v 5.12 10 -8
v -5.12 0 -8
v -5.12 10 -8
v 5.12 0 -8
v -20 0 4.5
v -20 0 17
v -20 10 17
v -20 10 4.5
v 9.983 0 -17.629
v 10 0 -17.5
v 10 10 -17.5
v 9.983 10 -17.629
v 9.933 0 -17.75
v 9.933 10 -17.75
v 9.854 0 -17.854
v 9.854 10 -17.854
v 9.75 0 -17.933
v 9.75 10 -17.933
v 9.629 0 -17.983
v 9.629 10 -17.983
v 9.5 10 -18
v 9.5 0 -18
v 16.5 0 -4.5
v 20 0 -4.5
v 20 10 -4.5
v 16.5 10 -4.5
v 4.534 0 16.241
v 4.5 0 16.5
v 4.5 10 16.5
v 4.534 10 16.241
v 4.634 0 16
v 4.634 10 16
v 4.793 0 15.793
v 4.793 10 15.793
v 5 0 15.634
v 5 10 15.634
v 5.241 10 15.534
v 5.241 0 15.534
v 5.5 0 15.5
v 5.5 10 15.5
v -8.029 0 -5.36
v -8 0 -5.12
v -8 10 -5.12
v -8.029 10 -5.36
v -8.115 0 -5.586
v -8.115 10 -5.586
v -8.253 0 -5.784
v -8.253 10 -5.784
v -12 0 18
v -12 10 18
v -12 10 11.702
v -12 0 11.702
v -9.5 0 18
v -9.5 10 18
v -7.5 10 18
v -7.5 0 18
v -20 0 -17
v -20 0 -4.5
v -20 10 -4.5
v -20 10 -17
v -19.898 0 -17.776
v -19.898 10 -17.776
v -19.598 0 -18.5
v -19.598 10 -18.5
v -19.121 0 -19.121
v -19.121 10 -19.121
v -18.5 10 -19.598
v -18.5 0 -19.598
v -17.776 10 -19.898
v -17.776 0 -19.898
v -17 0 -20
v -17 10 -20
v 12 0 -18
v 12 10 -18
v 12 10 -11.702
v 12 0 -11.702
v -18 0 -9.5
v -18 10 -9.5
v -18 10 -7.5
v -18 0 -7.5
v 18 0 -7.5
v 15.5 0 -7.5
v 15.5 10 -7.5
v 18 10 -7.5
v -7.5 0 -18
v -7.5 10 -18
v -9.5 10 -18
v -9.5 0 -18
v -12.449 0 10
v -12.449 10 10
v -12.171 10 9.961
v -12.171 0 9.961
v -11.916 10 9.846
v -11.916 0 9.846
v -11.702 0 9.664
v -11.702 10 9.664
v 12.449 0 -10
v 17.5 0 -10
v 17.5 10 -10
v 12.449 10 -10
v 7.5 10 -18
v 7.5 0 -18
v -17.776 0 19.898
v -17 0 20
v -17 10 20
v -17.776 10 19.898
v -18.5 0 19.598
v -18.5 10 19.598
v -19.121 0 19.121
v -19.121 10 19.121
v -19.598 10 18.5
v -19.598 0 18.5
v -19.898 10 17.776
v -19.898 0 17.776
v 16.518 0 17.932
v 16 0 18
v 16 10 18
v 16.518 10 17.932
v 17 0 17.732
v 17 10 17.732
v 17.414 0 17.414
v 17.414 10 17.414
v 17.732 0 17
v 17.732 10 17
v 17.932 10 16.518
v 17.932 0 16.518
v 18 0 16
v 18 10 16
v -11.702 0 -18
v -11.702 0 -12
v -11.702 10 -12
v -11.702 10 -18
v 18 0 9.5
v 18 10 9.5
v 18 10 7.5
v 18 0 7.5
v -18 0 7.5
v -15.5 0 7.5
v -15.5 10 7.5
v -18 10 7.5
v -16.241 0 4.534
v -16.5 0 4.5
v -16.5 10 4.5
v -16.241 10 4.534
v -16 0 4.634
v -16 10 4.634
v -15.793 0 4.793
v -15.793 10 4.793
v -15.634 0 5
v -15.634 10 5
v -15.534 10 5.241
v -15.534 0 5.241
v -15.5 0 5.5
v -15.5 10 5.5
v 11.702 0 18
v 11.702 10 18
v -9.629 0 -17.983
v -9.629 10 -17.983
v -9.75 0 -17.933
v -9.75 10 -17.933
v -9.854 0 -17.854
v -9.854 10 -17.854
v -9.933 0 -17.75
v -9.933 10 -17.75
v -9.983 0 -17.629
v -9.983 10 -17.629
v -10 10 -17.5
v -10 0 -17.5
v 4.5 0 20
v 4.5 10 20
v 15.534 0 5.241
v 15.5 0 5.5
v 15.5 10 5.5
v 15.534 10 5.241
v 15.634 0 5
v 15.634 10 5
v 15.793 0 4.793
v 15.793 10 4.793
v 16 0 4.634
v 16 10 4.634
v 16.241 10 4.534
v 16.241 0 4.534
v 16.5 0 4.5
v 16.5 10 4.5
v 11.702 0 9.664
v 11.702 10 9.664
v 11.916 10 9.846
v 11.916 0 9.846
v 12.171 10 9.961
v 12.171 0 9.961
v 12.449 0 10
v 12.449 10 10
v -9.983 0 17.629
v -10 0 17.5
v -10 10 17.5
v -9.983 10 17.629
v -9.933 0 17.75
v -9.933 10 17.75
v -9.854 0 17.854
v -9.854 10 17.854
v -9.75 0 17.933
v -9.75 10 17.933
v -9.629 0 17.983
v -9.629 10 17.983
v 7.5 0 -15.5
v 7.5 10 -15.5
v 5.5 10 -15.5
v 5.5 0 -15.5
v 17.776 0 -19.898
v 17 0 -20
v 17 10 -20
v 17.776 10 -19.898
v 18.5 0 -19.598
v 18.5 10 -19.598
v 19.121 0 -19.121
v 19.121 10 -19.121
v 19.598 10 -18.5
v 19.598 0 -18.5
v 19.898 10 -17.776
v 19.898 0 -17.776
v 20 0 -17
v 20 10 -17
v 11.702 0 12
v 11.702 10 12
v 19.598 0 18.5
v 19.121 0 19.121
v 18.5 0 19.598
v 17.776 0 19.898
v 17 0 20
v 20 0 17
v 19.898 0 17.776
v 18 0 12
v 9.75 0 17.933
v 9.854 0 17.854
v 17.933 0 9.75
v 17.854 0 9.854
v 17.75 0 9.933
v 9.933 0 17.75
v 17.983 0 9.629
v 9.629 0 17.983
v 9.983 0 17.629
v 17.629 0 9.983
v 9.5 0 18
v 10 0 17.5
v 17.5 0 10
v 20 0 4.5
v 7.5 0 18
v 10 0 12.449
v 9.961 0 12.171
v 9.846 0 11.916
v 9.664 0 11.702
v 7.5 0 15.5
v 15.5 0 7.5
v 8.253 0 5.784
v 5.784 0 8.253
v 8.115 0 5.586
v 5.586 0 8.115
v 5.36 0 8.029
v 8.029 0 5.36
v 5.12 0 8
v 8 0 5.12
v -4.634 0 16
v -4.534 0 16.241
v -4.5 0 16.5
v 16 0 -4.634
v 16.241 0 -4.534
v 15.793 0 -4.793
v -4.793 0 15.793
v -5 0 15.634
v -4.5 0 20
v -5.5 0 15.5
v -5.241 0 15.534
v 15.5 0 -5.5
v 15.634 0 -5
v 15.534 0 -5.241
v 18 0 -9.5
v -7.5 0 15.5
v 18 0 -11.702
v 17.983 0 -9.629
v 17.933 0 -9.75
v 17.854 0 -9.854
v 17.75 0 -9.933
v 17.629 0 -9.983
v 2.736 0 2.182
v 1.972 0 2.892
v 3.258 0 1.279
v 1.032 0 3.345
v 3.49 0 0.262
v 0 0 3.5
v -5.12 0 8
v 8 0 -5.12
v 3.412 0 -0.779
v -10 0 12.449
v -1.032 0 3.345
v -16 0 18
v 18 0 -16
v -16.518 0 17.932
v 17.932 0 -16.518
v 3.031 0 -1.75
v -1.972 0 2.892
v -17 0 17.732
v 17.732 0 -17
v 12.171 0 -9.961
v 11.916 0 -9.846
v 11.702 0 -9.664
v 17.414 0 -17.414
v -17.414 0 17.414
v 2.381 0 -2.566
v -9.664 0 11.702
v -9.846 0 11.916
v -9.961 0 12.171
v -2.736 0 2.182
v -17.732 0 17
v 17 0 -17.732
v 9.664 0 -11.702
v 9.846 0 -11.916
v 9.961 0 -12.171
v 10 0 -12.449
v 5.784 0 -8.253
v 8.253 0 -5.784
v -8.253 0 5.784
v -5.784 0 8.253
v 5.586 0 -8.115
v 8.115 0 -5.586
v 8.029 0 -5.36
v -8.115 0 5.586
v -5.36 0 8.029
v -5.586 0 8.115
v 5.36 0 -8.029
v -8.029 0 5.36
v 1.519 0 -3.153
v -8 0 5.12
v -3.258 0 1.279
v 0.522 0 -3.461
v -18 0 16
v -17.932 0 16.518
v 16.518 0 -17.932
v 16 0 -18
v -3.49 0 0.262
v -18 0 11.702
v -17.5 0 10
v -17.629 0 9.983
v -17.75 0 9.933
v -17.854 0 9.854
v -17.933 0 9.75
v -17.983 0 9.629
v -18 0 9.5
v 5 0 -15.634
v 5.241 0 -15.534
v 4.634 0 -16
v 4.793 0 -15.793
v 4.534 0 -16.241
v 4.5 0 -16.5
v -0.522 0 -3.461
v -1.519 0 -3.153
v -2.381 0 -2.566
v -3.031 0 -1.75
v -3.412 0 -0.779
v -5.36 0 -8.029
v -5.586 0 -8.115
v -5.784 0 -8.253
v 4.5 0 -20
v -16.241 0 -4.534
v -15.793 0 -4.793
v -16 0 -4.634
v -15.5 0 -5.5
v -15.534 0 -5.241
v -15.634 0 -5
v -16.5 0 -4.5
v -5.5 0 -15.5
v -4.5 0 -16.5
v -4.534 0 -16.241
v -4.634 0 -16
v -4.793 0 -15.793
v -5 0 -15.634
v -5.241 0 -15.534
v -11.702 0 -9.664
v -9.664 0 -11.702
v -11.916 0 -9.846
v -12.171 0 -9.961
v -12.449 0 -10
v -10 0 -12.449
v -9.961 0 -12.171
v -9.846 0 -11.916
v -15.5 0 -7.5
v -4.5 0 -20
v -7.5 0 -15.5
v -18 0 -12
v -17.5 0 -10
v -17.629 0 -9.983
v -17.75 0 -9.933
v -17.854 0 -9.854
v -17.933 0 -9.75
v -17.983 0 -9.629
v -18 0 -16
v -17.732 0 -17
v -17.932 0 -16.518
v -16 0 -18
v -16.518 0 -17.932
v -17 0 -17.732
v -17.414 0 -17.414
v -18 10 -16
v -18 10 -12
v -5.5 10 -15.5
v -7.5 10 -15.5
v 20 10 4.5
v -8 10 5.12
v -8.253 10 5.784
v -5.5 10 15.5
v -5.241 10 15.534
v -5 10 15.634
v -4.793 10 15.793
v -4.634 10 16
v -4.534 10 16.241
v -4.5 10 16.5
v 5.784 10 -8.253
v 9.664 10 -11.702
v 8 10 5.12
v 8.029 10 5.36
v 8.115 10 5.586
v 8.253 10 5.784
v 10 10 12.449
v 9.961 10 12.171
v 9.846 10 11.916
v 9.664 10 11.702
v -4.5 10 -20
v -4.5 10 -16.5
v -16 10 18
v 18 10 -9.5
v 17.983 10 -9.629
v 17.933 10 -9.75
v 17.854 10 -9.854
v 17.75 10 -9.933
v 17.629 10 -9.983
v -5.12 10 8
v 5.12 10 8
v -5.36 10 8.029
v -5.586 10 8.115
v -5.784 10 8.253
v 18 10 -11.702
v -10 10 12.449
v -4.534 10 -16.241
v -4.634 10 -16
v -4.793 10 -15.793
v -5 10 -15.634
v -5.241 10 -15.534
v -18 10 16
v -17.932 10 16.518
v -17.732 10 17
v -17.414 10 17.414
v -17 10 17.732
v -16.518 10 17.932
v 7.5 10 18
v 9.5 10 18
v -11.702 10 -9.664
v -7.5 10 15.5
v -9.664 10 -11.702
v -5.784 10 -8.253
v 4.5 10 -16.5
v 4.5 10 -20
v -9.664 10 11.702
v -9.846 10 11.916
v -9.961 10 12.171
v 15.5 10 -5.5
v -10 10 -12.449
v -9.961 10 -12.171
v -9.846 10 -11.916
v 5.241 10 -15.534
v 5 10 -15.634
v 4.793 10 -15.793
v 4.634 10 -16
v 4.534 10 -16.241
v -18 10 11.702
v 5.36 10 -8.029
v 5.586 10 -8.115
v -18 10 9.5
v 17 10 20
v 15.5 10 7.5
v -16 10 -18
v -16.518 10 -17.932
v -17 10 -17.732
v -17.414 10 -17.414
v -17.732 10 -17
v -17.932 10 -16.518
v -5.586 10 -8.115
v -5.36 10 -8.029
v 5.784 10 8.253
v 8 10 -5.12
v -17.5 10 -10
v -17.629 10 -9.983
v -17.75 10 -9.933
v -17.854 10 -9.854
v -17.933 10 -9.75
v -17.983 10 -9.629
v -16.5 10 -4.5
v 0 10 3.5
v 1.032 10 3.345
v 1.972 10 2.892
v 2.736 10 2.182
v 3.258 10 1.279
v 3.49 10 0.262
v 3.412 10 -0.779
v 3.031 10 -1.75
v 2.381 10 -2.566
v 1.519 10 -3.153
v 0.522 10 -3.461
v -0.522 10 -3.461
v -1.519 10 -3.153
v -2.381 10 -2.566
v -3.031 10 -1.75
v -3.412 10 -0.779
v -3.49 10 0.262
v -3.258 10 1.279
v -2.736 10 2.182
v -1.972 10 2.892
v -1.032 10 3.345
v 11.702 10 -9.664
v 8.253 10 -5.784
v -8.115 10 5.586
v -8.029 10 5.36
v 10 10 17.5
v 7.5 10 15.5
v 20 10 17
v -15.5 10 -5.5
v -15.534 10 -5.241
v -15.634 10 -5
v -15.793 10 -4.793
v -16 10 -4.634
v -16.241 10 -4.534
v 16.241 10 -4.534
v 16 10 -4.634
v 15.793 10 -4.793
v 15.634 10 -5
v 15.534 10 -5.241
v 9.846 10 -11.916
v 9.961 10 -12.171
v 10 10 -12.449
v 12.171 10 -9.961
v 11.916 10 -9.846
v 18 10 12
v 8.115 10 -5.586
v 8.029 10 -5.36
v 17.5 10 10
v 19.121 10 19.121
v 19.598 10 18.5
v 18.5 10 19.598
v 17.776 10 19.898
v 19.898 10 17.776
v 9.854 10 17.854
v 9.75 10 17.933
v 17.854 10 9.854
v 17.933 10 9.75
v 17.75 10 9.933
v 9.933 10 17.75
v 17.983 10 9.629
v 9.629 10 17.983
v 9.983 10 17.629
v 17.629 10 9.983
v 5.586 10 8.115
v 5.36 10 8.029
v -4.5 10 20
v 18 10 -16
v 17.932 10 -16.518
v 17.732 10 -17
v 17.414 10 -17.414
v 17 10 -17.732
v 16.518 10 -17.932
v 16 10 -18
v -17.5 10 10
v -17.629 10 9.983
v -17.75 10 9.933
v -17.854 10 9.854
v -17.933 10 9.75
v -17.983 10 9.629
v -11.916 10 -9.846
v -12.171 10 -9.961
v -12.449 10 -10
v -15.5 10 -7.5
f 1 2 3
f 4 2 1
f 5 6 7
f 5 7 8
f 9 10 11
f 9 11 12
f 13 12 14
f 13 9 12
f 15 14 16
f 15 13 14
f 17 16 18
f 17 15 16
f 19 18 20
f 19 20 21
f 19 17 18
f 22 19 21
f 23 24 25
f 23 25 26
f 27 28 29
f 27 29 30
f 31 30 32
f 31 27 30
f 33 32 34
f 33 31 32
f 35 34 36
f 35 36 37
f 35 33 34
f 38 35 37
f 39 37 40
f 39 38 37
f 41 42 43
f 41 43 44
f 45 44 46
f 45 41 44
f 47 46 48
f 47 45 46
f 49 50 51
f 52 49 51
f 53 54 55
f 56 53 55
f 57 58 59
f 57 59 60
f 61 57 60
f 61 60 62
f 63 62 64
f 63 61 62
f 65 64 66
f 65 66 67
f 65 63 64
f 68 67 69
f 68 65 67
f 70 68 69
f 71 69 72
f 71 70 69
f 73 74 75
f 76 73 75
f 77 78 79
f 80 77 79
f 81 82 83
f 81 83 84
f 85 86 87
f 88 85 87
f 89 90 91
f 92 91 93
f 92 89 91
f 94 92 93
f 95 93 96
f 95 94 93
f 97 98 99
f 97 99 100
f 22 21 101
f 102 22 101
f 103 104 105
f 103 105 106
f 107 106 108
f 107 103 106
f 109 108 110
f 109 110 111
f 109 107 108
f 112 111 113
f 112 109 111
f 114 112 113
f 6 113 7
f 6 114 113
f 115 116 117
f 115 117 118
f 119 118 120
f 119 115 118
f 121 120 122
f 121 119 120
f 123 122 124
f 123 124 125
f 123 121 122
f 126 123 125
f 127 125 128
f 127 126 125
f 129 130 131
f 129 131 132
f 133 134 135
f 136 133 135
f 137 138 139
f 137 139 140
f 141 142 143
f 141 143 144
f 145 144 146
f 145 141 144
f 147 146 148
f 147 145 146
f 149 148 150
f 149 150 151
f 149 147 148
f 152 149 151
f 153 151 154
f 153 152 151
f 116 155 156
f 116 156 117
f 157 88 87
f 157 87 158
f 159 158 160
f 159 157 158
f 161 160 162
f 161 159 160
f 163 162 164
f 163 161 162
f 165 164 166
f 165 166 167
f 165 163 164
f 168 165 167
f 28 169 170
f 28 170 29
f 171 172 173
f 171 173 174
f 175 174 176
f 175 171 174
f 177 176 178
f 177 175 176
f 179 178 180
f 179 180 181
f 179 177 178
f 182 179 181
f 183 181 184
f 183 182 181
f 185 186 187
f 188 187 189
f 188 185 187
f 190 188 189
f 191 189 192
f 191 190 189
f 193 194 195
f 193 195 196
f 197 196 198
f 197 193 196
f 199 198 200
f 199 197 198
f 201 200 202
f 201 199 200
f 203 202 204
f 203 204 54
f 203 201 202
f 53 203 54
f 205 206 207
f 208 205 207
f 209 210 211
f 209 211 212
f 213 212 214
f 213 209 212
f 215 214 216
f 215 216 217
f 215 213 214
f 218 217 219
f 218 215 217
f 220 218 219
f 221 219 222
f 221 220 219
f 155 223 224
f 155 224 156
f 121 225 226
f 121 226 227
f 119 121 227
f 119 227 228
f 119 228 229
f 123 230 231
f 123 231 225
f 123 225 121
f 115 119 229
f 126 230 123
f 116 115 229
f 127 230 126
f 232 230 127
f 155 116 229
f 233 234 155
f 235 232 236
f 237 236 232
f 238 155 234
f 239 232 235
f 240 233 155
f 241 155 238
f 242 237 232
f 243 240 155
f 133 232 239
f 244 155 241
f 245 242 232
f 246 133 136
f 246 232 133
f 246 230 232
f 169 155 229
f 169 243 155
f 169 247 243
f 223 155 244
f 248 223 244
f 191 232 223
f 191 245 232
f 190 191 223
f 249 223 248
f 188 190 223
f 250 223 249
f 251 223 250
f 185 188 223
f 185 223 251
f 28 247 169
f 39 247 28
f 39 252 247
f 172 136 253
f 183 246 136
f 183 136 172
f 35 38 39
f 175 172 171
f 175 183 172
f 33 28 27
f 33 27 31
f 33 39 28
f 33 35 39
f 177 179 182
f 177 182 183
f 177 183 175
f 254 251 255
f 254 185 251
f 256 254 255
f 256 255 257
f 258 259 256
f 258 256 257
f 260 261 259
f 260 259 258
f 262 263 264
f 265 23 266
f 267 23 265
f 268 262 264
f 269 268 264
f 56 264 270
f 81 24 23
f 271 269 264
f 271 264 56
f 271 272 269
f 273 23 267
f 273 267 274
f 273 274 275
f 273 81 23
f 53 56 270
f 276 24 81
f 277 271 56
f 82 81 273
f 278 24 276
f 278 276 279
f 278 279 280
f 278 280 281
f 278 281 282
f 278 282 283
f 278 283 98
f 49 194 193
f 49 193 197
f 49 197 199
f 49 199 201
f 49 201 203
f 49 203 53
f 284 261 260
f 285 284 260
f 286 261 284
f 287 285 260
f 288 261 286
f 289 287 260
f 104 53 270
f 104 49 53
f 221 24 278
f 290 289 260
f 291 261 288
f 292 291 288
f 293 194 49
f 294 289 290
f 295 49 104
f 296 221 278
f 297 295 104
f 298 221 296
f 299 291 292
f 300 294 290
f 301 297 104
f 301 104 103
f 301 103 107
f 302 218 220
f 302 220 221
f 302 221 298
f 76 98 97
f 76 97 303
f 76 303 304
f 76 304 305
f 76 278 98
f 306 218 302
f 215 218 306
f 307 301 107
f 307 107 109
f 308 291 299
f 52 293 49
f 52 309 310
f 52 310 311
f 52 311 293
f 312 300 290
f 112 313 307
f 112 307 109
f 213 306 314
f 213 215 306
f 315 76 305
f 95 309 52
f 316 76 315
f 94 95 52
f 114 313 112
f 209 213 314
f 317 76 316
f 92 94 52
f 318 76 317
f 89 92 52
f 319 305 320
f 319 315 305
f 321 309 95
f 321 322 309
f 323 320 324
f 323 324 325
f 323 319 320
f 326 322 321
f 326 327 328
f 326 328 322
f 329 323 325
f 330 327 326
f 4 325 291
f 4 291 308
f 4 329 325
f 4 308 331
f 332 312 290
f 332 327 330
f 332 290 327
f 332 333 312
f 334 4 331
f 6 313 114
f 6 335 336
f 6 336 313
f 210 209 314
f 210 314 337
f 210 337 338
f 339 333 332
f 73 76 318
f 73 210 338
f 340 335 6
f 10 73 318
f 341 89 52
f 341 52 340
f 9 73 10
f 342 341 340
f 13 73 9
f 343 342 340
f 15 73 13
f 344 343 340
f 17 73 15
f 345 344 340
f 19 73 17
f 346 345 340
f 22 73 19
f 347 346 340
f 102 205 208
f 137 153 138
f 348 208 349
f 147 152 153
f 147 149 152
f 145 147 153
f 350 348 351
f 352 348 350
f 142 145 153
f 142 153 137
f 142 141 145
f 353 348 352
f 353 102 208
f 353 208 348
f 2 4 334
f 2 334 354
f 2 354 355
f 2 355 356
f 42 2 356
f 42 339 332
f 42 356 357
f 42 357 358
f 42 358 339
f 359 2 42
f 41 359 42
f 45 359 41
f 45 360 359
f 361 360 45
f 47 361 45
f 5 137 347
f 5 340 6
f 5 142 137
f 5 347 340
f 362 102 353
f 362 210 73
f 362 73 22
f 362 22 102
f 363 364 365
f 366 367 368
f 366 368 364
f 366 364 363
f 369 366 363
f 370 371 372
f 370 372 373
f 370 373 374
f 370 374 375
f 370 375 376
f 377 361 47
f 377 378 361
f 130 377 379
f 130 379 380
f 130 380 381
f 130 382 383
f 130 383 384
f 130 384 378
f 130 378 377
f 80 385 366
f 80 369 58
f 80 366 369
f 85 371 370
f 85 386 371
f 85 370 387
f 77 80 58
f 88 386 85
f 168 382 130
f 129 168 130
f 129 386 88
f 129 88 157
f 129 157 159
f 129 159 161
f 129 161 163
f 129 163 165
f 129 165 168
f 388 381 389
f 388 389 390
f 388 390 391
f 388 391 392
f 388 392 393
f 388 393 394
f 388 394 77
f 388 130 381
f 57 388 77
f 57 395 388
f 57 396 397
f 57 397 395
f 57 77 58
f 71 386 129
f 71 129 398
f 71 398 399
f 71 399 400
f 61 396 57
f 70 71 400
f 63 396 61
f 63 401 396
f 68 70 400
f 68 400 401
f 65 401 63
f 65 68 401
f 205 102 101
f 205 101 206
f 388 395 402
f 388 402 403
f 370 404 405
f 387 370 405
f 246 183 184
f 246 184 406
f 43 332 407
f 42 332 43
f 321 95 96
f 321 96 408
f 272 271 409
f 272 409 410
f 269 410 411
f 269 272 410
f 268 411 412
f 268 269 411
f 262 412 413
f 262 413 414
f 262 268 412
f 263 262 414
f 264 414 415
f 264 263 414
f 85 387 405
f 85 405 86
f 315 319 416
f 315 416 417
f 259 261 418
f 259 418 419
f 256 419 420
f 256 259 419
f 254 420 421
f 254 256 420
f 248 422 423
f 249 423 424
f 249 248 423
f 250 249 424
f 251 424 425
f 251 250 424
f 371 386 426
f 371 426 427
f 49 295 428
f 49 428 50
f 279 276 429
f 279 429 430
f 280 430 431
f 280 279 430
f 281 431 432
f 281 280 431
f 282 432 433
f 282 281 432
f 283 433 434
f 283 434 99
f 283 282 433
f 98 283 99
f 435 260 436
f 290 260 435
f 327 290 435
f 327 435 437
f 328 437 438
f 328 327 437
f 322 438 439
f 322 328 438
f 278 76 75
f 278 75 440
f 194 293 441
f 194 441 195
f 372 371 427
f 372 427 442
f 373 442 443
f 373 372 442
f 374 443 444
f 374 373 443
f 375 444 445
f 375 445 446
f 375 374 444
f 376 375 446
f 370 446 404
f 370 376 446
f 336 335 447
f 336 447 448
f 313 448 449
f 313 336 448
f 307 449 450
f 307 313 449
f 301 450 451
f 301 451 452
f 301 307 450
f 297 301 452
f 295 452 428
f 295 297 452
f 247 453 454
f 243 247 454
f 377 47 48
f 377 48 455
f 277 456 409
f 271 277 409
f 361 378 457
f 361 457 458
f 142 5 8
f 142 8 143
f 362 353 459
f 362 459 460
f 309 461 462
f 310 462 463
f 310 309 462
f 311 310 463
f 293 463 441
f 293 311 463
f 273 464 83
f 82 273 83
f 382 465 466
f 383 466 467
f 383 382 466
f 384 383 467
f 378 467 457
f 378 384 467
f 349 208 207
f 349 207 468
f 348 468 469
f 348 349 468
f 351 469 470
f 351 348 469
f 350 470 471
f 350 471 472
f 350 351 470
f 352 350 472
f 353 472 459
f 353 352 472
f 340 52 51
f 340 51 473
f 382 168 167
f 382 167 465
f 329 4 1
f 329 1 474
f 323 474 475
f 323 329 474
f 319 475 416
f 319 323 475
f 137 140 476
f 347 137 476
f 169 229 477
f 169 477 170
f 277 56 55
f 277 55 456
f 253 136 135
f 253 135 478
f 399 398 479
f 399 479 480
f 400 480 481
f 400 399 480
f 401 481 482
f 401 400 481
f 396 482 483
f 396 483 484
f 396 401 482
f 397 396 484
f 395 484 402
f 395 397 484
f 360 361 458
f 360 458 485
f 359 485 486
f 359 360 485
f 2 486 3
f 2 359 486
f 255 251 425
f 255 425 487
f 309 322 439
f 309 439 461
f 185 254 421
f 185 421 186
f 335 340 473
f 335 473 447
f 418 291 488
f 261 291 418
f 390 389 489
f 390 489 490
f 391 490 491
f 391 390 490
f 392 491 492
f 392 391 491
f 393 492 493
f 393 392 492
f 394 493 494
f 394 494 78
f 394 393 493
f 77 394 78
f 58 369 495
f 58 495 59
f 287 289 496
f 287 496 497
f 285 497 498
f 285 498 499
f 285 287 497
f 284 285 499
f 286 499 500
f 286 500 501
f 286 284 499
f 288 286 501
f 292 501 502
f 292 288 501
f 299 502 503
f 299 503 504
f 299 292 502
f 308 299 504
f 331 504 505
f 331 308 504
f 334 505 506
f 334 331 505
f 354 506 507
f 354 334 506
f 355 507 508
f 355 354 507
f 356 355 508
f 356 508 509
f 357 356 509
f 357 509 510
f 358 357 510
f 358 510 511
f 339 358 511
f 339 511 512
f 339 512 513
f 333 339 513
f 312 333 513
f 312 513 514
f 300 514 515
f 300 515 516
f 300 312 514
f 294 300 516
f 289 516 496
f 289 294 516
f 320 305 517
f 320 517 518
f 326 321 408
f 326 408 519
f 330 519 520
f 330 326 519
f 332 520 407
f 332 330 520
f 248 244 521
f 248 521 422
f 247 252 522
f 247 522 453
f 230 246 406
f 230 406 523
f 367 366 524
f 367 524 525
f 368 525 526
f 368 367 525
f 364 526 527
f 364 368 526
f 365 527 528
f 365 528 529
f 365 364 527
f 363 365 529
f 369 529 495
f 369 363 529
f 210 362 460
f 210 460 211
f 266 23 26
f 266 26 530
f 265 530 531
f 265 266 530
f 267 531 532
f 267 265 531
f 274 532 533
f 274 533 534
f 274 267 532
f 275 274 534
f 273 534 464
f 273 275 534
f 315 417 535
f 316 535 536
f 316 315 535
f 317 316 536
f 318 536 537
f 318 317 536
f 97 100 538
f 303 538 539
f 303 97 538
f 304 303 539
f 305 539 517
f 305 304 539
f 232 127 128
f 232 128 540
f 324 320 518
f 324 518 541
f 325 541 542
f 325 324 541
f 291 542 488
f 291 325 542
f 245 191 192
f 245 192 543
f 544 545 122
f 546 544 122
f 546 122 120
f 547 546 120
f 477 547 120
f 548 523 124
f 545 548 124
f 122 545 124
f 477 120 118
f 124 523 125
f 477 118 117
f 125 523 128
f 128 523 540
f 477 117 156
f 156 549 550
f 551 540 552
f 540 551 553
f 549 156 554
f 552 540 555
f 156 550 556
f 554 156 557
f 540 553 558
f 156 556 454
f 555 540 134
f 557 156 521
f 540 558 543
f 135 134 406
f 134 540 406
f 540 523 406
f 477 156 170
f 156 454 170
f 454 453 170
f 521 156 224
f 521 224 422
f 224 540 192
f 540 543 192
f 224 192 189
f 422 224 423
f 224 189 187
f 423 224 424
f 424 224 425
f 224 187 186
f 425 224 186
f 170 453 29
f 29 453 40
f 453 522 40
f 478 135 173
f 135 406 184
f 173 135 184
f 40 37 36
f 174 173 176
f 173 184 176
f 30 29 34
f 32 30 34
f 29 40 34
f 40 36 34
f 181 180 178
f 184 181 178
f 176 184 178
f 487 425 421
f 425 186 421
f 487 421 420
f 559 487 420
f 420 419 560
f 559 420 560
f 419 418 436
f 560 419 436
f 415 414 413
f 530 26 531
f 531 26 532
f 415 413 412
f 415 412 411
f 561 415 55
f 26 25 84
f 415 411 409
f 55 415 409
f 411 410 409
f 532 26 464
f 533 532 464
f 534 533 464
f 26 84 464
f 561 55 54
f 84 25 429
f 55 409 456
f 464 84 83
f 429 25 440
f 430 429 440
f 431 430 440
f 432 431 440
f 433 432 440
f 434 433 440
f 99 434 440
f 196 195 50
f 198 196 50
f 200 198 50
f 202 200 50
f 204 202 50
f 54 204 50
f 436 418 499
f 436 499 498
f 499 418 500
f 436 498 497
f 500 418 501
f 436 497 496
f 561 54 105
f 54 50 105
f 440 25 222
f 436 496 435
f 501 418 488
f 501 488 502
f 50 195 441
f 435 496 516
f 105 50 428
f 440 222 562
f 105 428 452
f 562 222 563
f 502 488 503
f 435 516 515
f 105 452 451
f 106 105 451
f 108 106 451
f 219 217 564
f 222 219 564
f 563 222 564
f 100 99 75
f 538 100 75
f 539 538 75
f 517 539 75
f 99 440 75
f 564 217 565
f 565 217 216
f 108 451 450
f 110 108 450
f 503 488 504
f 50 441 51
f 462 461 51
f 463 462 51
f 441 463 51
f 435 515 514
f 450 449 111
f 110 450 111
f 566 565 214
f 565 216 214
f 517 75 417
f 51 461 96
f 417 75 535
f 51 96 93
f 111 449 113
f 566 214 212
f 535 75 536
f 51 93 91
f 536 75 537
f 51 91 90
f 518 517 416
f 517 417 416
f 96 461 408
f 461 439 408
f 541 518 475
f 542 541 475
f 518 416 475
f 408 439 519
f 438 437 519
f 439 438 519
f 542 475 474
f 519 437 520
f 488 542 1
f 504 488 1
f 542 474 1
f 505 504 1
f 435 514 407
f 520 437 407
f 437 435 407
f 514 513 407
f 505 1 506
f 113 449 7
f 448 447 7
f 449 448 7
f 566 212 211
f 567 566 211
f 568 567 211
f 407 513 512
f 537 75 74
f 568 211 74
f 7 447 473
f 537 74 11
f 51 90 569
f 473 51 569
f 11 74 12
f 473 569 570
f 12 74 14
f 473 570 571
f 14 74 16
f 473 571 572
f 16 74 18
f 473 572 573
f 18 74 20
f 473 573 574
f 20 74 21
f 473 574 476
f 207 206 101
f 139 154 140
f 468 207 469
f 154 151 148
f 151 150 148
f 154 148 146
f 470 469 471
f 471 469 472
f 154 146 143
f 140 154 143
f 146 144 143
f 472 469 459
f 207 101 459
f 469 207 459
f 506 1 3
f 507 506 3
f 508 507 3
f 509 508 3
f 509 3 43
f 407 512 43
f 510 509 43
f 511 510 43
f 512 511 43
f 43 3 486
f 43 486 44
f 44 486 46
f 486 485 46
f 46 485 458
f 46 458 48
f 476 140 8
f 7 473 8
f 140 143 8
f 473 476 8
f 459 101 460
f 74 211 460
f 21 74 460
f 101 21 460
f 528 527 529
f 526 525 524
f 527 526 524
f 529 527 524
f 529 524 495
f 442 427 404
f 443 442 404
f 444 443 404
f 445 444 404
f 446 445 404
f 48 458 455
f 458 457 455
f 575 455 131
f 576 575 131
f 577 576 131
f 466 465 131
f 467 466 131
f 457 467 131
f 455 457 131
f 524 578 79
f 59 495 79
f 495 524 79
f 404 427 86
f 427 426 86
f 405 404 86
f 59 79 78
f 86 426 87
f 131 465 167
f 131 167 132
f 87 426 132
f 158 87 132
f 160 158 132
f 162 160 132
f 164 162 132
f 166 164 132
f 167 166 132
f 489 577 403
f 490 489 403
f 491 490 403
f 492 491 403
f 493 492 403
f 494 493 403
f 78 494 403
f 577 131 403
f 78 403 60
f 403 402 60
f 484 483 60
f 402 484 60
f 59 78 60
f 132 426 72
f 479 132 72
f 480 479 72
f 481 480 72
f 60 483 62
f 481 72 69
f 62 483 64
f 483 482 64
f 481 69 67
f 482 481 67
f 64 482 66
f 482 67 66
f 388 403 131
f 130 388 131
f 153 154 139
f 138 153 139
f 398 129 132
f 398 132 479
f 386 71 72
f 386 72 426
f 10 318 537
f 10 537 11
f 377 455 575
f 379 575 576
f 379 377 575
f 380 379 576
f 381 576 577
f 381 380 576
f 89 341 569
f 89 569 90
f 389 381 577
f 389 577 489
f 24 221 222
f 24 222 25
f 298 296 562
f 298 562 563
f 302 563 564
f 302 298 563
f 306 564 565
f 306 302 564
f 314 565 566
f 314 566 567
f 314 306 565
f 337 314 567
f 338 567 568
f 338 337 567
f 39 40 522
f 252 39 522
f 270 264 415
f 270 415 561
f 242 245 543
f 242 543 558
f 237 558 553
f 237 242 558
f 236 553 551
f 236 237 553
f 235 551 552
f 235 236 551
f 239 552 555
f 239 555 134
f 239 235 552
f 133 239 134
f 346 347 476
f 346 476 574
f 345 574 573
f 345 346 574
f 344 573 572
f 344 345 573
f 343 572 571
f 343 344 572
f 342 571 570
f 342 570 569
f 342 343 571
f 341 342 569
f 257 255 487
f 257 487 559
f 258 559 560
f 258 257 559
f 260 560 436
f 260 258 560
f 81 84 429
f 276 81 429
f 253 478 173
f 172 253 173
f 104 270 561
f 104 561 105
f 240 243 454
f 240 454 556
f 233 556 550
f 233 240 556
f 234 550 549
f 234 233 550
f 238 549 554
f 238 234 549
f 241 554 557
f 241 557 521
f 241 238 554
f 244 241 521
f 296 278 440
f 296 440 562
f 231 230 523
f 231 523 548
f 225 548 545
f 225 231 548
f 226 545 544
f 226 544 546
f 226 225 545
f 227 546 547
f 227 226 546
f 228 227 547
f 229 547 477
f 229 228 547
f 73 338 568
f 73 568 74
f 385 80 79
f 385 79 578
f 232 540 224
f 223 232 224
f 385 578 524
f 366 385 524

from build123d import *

# Parameters (mm, degrees)
SKETCH_1_R      = 3.5
EXTRUDE_1_DEPTH = 10


with BuildPart() as part:
    # 草图1 → 凸台-拉伸1 (new body)
    with BuildSketch(Plane(origin=(0, 0, 0), x_dir=(1, 0, 0), z_dir=(0, 1, 0))):
        with BuildLine():
            Line((11.701656746, 9.664363839), (8.252590681, 5.784164516))
            ThreePointArc((8.252590681, 5.784164516), (8.065278298, 5.475181235), (8, 5.119800678))
            Line((8, 5.119800678), (8, -5.119800678))
            ThreePointArc((8, -5.119800678), (8.065278298, -5.475181235), (8.252590681, -5.784164516))
            Line((8.252590681, -5.784164516), (11.701656746, -9.664363839))
            ThreePointArc((11.701656746, -9.664363839), (12.039410013, -9.912240056), (12.449066064, -10))
            Line((12.449066064, -10), (17.5, -10))
            ThreePointArc((17.5, -10), (17.853553391, -9.853553391), (18, -9.5))
            Line((18, -9.5), (18, -7.5))
            Line((18, -7.5), (15.5, -7.5))
            Line((15.5, -7.5), (15.5, -5.5))
            ThreePointArc((15.5, -5.5), (15.792893219, -4.792893219), (16.5, -4.5))
            Line((16.5, -4.5), (20, -4.5))
            Line((20, -4.5), (20, -17))
            ThreePointArc((20, -17), (19.121320344, -19.121320344), (17, -20))
            Line((17, -20), (4.5, -20))
            Line((4.5, -20), (4.5, -16.5))
            ThreePointArc((4.5, -16.5), (4.792893219, -15.792893219), (5.5, -15.5))
            Line((5.5, -15.5), (7.5, -15.5))
            Line((7.5, -15.5), (7.5, -18))
            Line((7.5, -18), (9.5, -18))
            ThreePointArc((9.5, -18), (9.853553391, -17.853553391), (10, -17.5))
            Line((10, -17.5), (10, -12.449066064))
            ThreePointArc((10, -12.449066064), (9.912240056, -12.039410013), (9.664363839, -11.701656746))
            Line((9.664363839, -11.701656746), (5.784164516, -8.252590681))
            ThreePointArc((5.784164516, -8.252590681), (5.475181235, -8.065278298), (5.119800678, -8))
            Line((5.119800678, -8), (-5.119800678, -8))
            ThreePointArc((-5.119800678, -8), (-5.475181235, -8.065278298), (-5.784164516, -8.252590681))
            Line((-5.784164516, -8.252590681), (-9.664363839, -11.701656746))
            ThreePointArc((-9.664363839, -11.701656746), (-9.912240056, -12.039410013), (-10, -12.449066064))
            Line((-10, -12.449066064), (-10, -17.5))
            ThreePointArc((-10, -17.5), (-9.853553391, -17.853553391), (-9.5, -18))
            Line((-9.5, -18), (-7.5, -18))
            Line((-7.5, -18), (-7.5, -15.5))
            Line((-7.5, -15.5), (-5.5, -15.5))
            ThreePointArc((-5.5, -15.5), (-4.792893219, -15.792893219), (-4.5, -16.5))
            Line((-4.5, -16.5), (-4.5, -20))
            Line((-4.5, -20), (-17, -20))
            ThreePointArc((-17, -20), (-19.121320344, -19.121320344), (-20, -17))
            Line((-20, -17), (-20, -4.5))
            Line((-20, -4.5), (-16.5, -4.5))
            ThreePointArc((-16.5, -4.5), (-15.792893219, -4.792893219), (-15.5, -5.5))
            Line((-15.5, -5.5), (-15.5, -7.5))
            Line((-15.5, -7.5), (-18, -7.5))
            Line((-18, -7.5), (-18, -9.5))
            ThreePointArc((-18, -9.5), (-17.853553391, -9.853553391), (-17.5, -10))
            Line((-17.5, -10), (-12.449066064, -10))
            ThreePointArc((-12.449066064, -10), (-12.039410013, -9.912240056), (-11.701656746, -9.664363839))
            Line((-11.701656746, -9.664363839), (-8.252590681, -5.784164516))
            ThreePointArc((-8.252590681, -5.784164516), (-8.065278298, -5.475181235), (-8, -5.119800678))
            Line((-8, -5.119800678), (-8, 5.119800678))
            ThreePointArc((-8, 5.119800678), (-8.065278298, 5.475181235), (-8.252590681, 5.784164516))
            Line((-8.252590681, 5.784164516), (-11.701656746, 9.664363839))
            ThreePointArc((-11.701656746, 9.664363839), (-12.039410013, 9.912240056), (-12.449066064, 10))
            Line((-12.449066064, 10), (-17.5, 10))
            ThreePointArc((-17.5, 10), (-17.853553391, 9.853553391), (-18, 9.5))
            Line((-18, 9.5), (-18, 7.5))
            Line((-18, 7.5), (-15.5, 7.5))
            Line((-15.5, 7.5), (-15.5, 5.5))
            ThreePointArc((-15.5, 5.5), (-15.792893219, 4.792893219), (-16.5, 4.5))
            Line((-16.5, 4.5), (-20, 4.5))
            Line((-20, 4.5), (-20, 17))
            ThreePointArc((-20, 17), (-19.121320344, 19.121320344), (-17, 20))
            Line((-17, 20), (-4.5, 20))
            Line((-4.5, 20), (-4.5, 16.5))
            ThreePointArc((-4.5, 16.5), (-4.792893219, 15.792893219), (-5.5, 15.5))
            Line((-5.5, 15.5), (-7.5, 15.5))
            Line((-7.5, 15.5), (-7.5, 18))
            Line((-7.5, 18), (-9.5, 18))
            ThreePointArc((-9.5, 18), (-9.853553391, 17.853553391), (-10, 17.5))
            Line((-10, 17.5), (-10, 12.449066064))
            ThreePointArc((-10, 12.449066064), (-9.912240056, 12.039410013), (-9.664363839, 11.701656746))
            Line((-9.664363839, 11.701656746), (-5.784164516, 8.252590681))
            ThreePointArc((-5.784164516, 8.252590681), (-5.475181235, 8.065278298), (-5.119800678, 8))
            Line((-5.119800678, 8), (5.119800678, 8))
            ThreePointArc((5.119800678, 8), (5.475181235, 8.065278298), (5.784164516, 8.252590681))
            Line((5.784164516, 8.252590681), (9.664363839, 11.701656746))
            ThreePointArc((9.664363839, 11.701656746), (9.912240056, 12.039410013), (10, 12.449066064))
            Line((10, 12.449066064), (10, 17.5))
            ThreePointArc((10, 17.5), (9.853553391, 17.853553391), (9.5, 18))
            Line((9.5, 18), (7.5, 18))
            Line((7.5, 18), (7.5, 15.5))
            Line((7.5, 15.5), (5.5, 15.5))
            ThreePointArc((5.5, 15.5), (4.792893219, 15.792893219), (4.5, 16.5))
            Line((4.5, 16.5), (4.5, 20))
            Line((4.5, 20), (17, 20))
            ThreePointArc((17, 20), (19.121320344, 19.121320344), (20, 17))
            Line((20, 17), (20, 4.5))
            Line((20, 4.5), (16.5, 4.5))
            ThreePointArc((16.5, 4.5), (15.792893219, 4.792893219), (15.5, 5.5))
            Line((15.5, 5.5), (15.5, 7.5))
            Line((15.5, 7.5), (18, 7.5))
            Line((18, 7.5), (18, 9.5))
            ThreePointArc((18, 9.5), (17.853553391, 9.853553391), (17.5, 10))
            Line((17.5, 10), (12.449066064, 10))
            ThreePointArc((12.449066064, 10), (12.039410013, 9.912240056), (11.701656746, 9.664363839))
        make_face()
        with Locations(Location((0, 0, 0), (0, 0, 270))):
            Circle(SKETCH_1_R, mode=Mode.SUBTRACT)
        with BuildLine():
            Line((18, -12), (11.701656746, -12))
            Line((11.701656746, -12), (11.701656746, -18))
            Line((11.701656746, -18), (16, -18))
            ThreePointArc((16, -18), (17.414213562, -17.414213562), (18, -16))
            Line((18, -16), (18, -12))
        make_face(mode=Mode.SUBTRACT)
        with BuildLine():
            Line((12, 18), (12, 11.701656746))
            Line((12, 11.701656746), (18, 11.701656746))
            Line((18, 11.701656746), (18, 16))
            ThreePointArc((18, 16), (17.414213562, 17.414213562), (16, 18))
            Line((16, 18), (12, 18))
        make_face(mode=Mode.SUBTRACT)
        with BuildLine():
            Line((-12, -18), (-12, -11.701656746))
            Line((-12, -11.701656746), (-18, -11.701656746))
            Line((-18, -11.701656746), (-18, -16))
            ThreePointArc((-18, -16), (-17.414213562, -17.414213562), (-16, -18))
            Line((-16, -18), (-12, -18))
        make_face(mode=Mode.SUBTRACT)
        with BuildLine():
            Line((-18, 12), (-11.701656746, 12))
            Line((-11.701656746, 12), (-11.701656746, 18))
            Line((-11.701656746, 18), (-16, 18))
            ThreePointArc((-16, 18), (-17.414213562, 17.414213562), (-18, 16))
            Line((-18, 16), (-18, 12))
        make_face(mode=Mode.SUBTRACT)
    extrude(amount=EXTRUDE_1_DEPTH)


solid = part.part
